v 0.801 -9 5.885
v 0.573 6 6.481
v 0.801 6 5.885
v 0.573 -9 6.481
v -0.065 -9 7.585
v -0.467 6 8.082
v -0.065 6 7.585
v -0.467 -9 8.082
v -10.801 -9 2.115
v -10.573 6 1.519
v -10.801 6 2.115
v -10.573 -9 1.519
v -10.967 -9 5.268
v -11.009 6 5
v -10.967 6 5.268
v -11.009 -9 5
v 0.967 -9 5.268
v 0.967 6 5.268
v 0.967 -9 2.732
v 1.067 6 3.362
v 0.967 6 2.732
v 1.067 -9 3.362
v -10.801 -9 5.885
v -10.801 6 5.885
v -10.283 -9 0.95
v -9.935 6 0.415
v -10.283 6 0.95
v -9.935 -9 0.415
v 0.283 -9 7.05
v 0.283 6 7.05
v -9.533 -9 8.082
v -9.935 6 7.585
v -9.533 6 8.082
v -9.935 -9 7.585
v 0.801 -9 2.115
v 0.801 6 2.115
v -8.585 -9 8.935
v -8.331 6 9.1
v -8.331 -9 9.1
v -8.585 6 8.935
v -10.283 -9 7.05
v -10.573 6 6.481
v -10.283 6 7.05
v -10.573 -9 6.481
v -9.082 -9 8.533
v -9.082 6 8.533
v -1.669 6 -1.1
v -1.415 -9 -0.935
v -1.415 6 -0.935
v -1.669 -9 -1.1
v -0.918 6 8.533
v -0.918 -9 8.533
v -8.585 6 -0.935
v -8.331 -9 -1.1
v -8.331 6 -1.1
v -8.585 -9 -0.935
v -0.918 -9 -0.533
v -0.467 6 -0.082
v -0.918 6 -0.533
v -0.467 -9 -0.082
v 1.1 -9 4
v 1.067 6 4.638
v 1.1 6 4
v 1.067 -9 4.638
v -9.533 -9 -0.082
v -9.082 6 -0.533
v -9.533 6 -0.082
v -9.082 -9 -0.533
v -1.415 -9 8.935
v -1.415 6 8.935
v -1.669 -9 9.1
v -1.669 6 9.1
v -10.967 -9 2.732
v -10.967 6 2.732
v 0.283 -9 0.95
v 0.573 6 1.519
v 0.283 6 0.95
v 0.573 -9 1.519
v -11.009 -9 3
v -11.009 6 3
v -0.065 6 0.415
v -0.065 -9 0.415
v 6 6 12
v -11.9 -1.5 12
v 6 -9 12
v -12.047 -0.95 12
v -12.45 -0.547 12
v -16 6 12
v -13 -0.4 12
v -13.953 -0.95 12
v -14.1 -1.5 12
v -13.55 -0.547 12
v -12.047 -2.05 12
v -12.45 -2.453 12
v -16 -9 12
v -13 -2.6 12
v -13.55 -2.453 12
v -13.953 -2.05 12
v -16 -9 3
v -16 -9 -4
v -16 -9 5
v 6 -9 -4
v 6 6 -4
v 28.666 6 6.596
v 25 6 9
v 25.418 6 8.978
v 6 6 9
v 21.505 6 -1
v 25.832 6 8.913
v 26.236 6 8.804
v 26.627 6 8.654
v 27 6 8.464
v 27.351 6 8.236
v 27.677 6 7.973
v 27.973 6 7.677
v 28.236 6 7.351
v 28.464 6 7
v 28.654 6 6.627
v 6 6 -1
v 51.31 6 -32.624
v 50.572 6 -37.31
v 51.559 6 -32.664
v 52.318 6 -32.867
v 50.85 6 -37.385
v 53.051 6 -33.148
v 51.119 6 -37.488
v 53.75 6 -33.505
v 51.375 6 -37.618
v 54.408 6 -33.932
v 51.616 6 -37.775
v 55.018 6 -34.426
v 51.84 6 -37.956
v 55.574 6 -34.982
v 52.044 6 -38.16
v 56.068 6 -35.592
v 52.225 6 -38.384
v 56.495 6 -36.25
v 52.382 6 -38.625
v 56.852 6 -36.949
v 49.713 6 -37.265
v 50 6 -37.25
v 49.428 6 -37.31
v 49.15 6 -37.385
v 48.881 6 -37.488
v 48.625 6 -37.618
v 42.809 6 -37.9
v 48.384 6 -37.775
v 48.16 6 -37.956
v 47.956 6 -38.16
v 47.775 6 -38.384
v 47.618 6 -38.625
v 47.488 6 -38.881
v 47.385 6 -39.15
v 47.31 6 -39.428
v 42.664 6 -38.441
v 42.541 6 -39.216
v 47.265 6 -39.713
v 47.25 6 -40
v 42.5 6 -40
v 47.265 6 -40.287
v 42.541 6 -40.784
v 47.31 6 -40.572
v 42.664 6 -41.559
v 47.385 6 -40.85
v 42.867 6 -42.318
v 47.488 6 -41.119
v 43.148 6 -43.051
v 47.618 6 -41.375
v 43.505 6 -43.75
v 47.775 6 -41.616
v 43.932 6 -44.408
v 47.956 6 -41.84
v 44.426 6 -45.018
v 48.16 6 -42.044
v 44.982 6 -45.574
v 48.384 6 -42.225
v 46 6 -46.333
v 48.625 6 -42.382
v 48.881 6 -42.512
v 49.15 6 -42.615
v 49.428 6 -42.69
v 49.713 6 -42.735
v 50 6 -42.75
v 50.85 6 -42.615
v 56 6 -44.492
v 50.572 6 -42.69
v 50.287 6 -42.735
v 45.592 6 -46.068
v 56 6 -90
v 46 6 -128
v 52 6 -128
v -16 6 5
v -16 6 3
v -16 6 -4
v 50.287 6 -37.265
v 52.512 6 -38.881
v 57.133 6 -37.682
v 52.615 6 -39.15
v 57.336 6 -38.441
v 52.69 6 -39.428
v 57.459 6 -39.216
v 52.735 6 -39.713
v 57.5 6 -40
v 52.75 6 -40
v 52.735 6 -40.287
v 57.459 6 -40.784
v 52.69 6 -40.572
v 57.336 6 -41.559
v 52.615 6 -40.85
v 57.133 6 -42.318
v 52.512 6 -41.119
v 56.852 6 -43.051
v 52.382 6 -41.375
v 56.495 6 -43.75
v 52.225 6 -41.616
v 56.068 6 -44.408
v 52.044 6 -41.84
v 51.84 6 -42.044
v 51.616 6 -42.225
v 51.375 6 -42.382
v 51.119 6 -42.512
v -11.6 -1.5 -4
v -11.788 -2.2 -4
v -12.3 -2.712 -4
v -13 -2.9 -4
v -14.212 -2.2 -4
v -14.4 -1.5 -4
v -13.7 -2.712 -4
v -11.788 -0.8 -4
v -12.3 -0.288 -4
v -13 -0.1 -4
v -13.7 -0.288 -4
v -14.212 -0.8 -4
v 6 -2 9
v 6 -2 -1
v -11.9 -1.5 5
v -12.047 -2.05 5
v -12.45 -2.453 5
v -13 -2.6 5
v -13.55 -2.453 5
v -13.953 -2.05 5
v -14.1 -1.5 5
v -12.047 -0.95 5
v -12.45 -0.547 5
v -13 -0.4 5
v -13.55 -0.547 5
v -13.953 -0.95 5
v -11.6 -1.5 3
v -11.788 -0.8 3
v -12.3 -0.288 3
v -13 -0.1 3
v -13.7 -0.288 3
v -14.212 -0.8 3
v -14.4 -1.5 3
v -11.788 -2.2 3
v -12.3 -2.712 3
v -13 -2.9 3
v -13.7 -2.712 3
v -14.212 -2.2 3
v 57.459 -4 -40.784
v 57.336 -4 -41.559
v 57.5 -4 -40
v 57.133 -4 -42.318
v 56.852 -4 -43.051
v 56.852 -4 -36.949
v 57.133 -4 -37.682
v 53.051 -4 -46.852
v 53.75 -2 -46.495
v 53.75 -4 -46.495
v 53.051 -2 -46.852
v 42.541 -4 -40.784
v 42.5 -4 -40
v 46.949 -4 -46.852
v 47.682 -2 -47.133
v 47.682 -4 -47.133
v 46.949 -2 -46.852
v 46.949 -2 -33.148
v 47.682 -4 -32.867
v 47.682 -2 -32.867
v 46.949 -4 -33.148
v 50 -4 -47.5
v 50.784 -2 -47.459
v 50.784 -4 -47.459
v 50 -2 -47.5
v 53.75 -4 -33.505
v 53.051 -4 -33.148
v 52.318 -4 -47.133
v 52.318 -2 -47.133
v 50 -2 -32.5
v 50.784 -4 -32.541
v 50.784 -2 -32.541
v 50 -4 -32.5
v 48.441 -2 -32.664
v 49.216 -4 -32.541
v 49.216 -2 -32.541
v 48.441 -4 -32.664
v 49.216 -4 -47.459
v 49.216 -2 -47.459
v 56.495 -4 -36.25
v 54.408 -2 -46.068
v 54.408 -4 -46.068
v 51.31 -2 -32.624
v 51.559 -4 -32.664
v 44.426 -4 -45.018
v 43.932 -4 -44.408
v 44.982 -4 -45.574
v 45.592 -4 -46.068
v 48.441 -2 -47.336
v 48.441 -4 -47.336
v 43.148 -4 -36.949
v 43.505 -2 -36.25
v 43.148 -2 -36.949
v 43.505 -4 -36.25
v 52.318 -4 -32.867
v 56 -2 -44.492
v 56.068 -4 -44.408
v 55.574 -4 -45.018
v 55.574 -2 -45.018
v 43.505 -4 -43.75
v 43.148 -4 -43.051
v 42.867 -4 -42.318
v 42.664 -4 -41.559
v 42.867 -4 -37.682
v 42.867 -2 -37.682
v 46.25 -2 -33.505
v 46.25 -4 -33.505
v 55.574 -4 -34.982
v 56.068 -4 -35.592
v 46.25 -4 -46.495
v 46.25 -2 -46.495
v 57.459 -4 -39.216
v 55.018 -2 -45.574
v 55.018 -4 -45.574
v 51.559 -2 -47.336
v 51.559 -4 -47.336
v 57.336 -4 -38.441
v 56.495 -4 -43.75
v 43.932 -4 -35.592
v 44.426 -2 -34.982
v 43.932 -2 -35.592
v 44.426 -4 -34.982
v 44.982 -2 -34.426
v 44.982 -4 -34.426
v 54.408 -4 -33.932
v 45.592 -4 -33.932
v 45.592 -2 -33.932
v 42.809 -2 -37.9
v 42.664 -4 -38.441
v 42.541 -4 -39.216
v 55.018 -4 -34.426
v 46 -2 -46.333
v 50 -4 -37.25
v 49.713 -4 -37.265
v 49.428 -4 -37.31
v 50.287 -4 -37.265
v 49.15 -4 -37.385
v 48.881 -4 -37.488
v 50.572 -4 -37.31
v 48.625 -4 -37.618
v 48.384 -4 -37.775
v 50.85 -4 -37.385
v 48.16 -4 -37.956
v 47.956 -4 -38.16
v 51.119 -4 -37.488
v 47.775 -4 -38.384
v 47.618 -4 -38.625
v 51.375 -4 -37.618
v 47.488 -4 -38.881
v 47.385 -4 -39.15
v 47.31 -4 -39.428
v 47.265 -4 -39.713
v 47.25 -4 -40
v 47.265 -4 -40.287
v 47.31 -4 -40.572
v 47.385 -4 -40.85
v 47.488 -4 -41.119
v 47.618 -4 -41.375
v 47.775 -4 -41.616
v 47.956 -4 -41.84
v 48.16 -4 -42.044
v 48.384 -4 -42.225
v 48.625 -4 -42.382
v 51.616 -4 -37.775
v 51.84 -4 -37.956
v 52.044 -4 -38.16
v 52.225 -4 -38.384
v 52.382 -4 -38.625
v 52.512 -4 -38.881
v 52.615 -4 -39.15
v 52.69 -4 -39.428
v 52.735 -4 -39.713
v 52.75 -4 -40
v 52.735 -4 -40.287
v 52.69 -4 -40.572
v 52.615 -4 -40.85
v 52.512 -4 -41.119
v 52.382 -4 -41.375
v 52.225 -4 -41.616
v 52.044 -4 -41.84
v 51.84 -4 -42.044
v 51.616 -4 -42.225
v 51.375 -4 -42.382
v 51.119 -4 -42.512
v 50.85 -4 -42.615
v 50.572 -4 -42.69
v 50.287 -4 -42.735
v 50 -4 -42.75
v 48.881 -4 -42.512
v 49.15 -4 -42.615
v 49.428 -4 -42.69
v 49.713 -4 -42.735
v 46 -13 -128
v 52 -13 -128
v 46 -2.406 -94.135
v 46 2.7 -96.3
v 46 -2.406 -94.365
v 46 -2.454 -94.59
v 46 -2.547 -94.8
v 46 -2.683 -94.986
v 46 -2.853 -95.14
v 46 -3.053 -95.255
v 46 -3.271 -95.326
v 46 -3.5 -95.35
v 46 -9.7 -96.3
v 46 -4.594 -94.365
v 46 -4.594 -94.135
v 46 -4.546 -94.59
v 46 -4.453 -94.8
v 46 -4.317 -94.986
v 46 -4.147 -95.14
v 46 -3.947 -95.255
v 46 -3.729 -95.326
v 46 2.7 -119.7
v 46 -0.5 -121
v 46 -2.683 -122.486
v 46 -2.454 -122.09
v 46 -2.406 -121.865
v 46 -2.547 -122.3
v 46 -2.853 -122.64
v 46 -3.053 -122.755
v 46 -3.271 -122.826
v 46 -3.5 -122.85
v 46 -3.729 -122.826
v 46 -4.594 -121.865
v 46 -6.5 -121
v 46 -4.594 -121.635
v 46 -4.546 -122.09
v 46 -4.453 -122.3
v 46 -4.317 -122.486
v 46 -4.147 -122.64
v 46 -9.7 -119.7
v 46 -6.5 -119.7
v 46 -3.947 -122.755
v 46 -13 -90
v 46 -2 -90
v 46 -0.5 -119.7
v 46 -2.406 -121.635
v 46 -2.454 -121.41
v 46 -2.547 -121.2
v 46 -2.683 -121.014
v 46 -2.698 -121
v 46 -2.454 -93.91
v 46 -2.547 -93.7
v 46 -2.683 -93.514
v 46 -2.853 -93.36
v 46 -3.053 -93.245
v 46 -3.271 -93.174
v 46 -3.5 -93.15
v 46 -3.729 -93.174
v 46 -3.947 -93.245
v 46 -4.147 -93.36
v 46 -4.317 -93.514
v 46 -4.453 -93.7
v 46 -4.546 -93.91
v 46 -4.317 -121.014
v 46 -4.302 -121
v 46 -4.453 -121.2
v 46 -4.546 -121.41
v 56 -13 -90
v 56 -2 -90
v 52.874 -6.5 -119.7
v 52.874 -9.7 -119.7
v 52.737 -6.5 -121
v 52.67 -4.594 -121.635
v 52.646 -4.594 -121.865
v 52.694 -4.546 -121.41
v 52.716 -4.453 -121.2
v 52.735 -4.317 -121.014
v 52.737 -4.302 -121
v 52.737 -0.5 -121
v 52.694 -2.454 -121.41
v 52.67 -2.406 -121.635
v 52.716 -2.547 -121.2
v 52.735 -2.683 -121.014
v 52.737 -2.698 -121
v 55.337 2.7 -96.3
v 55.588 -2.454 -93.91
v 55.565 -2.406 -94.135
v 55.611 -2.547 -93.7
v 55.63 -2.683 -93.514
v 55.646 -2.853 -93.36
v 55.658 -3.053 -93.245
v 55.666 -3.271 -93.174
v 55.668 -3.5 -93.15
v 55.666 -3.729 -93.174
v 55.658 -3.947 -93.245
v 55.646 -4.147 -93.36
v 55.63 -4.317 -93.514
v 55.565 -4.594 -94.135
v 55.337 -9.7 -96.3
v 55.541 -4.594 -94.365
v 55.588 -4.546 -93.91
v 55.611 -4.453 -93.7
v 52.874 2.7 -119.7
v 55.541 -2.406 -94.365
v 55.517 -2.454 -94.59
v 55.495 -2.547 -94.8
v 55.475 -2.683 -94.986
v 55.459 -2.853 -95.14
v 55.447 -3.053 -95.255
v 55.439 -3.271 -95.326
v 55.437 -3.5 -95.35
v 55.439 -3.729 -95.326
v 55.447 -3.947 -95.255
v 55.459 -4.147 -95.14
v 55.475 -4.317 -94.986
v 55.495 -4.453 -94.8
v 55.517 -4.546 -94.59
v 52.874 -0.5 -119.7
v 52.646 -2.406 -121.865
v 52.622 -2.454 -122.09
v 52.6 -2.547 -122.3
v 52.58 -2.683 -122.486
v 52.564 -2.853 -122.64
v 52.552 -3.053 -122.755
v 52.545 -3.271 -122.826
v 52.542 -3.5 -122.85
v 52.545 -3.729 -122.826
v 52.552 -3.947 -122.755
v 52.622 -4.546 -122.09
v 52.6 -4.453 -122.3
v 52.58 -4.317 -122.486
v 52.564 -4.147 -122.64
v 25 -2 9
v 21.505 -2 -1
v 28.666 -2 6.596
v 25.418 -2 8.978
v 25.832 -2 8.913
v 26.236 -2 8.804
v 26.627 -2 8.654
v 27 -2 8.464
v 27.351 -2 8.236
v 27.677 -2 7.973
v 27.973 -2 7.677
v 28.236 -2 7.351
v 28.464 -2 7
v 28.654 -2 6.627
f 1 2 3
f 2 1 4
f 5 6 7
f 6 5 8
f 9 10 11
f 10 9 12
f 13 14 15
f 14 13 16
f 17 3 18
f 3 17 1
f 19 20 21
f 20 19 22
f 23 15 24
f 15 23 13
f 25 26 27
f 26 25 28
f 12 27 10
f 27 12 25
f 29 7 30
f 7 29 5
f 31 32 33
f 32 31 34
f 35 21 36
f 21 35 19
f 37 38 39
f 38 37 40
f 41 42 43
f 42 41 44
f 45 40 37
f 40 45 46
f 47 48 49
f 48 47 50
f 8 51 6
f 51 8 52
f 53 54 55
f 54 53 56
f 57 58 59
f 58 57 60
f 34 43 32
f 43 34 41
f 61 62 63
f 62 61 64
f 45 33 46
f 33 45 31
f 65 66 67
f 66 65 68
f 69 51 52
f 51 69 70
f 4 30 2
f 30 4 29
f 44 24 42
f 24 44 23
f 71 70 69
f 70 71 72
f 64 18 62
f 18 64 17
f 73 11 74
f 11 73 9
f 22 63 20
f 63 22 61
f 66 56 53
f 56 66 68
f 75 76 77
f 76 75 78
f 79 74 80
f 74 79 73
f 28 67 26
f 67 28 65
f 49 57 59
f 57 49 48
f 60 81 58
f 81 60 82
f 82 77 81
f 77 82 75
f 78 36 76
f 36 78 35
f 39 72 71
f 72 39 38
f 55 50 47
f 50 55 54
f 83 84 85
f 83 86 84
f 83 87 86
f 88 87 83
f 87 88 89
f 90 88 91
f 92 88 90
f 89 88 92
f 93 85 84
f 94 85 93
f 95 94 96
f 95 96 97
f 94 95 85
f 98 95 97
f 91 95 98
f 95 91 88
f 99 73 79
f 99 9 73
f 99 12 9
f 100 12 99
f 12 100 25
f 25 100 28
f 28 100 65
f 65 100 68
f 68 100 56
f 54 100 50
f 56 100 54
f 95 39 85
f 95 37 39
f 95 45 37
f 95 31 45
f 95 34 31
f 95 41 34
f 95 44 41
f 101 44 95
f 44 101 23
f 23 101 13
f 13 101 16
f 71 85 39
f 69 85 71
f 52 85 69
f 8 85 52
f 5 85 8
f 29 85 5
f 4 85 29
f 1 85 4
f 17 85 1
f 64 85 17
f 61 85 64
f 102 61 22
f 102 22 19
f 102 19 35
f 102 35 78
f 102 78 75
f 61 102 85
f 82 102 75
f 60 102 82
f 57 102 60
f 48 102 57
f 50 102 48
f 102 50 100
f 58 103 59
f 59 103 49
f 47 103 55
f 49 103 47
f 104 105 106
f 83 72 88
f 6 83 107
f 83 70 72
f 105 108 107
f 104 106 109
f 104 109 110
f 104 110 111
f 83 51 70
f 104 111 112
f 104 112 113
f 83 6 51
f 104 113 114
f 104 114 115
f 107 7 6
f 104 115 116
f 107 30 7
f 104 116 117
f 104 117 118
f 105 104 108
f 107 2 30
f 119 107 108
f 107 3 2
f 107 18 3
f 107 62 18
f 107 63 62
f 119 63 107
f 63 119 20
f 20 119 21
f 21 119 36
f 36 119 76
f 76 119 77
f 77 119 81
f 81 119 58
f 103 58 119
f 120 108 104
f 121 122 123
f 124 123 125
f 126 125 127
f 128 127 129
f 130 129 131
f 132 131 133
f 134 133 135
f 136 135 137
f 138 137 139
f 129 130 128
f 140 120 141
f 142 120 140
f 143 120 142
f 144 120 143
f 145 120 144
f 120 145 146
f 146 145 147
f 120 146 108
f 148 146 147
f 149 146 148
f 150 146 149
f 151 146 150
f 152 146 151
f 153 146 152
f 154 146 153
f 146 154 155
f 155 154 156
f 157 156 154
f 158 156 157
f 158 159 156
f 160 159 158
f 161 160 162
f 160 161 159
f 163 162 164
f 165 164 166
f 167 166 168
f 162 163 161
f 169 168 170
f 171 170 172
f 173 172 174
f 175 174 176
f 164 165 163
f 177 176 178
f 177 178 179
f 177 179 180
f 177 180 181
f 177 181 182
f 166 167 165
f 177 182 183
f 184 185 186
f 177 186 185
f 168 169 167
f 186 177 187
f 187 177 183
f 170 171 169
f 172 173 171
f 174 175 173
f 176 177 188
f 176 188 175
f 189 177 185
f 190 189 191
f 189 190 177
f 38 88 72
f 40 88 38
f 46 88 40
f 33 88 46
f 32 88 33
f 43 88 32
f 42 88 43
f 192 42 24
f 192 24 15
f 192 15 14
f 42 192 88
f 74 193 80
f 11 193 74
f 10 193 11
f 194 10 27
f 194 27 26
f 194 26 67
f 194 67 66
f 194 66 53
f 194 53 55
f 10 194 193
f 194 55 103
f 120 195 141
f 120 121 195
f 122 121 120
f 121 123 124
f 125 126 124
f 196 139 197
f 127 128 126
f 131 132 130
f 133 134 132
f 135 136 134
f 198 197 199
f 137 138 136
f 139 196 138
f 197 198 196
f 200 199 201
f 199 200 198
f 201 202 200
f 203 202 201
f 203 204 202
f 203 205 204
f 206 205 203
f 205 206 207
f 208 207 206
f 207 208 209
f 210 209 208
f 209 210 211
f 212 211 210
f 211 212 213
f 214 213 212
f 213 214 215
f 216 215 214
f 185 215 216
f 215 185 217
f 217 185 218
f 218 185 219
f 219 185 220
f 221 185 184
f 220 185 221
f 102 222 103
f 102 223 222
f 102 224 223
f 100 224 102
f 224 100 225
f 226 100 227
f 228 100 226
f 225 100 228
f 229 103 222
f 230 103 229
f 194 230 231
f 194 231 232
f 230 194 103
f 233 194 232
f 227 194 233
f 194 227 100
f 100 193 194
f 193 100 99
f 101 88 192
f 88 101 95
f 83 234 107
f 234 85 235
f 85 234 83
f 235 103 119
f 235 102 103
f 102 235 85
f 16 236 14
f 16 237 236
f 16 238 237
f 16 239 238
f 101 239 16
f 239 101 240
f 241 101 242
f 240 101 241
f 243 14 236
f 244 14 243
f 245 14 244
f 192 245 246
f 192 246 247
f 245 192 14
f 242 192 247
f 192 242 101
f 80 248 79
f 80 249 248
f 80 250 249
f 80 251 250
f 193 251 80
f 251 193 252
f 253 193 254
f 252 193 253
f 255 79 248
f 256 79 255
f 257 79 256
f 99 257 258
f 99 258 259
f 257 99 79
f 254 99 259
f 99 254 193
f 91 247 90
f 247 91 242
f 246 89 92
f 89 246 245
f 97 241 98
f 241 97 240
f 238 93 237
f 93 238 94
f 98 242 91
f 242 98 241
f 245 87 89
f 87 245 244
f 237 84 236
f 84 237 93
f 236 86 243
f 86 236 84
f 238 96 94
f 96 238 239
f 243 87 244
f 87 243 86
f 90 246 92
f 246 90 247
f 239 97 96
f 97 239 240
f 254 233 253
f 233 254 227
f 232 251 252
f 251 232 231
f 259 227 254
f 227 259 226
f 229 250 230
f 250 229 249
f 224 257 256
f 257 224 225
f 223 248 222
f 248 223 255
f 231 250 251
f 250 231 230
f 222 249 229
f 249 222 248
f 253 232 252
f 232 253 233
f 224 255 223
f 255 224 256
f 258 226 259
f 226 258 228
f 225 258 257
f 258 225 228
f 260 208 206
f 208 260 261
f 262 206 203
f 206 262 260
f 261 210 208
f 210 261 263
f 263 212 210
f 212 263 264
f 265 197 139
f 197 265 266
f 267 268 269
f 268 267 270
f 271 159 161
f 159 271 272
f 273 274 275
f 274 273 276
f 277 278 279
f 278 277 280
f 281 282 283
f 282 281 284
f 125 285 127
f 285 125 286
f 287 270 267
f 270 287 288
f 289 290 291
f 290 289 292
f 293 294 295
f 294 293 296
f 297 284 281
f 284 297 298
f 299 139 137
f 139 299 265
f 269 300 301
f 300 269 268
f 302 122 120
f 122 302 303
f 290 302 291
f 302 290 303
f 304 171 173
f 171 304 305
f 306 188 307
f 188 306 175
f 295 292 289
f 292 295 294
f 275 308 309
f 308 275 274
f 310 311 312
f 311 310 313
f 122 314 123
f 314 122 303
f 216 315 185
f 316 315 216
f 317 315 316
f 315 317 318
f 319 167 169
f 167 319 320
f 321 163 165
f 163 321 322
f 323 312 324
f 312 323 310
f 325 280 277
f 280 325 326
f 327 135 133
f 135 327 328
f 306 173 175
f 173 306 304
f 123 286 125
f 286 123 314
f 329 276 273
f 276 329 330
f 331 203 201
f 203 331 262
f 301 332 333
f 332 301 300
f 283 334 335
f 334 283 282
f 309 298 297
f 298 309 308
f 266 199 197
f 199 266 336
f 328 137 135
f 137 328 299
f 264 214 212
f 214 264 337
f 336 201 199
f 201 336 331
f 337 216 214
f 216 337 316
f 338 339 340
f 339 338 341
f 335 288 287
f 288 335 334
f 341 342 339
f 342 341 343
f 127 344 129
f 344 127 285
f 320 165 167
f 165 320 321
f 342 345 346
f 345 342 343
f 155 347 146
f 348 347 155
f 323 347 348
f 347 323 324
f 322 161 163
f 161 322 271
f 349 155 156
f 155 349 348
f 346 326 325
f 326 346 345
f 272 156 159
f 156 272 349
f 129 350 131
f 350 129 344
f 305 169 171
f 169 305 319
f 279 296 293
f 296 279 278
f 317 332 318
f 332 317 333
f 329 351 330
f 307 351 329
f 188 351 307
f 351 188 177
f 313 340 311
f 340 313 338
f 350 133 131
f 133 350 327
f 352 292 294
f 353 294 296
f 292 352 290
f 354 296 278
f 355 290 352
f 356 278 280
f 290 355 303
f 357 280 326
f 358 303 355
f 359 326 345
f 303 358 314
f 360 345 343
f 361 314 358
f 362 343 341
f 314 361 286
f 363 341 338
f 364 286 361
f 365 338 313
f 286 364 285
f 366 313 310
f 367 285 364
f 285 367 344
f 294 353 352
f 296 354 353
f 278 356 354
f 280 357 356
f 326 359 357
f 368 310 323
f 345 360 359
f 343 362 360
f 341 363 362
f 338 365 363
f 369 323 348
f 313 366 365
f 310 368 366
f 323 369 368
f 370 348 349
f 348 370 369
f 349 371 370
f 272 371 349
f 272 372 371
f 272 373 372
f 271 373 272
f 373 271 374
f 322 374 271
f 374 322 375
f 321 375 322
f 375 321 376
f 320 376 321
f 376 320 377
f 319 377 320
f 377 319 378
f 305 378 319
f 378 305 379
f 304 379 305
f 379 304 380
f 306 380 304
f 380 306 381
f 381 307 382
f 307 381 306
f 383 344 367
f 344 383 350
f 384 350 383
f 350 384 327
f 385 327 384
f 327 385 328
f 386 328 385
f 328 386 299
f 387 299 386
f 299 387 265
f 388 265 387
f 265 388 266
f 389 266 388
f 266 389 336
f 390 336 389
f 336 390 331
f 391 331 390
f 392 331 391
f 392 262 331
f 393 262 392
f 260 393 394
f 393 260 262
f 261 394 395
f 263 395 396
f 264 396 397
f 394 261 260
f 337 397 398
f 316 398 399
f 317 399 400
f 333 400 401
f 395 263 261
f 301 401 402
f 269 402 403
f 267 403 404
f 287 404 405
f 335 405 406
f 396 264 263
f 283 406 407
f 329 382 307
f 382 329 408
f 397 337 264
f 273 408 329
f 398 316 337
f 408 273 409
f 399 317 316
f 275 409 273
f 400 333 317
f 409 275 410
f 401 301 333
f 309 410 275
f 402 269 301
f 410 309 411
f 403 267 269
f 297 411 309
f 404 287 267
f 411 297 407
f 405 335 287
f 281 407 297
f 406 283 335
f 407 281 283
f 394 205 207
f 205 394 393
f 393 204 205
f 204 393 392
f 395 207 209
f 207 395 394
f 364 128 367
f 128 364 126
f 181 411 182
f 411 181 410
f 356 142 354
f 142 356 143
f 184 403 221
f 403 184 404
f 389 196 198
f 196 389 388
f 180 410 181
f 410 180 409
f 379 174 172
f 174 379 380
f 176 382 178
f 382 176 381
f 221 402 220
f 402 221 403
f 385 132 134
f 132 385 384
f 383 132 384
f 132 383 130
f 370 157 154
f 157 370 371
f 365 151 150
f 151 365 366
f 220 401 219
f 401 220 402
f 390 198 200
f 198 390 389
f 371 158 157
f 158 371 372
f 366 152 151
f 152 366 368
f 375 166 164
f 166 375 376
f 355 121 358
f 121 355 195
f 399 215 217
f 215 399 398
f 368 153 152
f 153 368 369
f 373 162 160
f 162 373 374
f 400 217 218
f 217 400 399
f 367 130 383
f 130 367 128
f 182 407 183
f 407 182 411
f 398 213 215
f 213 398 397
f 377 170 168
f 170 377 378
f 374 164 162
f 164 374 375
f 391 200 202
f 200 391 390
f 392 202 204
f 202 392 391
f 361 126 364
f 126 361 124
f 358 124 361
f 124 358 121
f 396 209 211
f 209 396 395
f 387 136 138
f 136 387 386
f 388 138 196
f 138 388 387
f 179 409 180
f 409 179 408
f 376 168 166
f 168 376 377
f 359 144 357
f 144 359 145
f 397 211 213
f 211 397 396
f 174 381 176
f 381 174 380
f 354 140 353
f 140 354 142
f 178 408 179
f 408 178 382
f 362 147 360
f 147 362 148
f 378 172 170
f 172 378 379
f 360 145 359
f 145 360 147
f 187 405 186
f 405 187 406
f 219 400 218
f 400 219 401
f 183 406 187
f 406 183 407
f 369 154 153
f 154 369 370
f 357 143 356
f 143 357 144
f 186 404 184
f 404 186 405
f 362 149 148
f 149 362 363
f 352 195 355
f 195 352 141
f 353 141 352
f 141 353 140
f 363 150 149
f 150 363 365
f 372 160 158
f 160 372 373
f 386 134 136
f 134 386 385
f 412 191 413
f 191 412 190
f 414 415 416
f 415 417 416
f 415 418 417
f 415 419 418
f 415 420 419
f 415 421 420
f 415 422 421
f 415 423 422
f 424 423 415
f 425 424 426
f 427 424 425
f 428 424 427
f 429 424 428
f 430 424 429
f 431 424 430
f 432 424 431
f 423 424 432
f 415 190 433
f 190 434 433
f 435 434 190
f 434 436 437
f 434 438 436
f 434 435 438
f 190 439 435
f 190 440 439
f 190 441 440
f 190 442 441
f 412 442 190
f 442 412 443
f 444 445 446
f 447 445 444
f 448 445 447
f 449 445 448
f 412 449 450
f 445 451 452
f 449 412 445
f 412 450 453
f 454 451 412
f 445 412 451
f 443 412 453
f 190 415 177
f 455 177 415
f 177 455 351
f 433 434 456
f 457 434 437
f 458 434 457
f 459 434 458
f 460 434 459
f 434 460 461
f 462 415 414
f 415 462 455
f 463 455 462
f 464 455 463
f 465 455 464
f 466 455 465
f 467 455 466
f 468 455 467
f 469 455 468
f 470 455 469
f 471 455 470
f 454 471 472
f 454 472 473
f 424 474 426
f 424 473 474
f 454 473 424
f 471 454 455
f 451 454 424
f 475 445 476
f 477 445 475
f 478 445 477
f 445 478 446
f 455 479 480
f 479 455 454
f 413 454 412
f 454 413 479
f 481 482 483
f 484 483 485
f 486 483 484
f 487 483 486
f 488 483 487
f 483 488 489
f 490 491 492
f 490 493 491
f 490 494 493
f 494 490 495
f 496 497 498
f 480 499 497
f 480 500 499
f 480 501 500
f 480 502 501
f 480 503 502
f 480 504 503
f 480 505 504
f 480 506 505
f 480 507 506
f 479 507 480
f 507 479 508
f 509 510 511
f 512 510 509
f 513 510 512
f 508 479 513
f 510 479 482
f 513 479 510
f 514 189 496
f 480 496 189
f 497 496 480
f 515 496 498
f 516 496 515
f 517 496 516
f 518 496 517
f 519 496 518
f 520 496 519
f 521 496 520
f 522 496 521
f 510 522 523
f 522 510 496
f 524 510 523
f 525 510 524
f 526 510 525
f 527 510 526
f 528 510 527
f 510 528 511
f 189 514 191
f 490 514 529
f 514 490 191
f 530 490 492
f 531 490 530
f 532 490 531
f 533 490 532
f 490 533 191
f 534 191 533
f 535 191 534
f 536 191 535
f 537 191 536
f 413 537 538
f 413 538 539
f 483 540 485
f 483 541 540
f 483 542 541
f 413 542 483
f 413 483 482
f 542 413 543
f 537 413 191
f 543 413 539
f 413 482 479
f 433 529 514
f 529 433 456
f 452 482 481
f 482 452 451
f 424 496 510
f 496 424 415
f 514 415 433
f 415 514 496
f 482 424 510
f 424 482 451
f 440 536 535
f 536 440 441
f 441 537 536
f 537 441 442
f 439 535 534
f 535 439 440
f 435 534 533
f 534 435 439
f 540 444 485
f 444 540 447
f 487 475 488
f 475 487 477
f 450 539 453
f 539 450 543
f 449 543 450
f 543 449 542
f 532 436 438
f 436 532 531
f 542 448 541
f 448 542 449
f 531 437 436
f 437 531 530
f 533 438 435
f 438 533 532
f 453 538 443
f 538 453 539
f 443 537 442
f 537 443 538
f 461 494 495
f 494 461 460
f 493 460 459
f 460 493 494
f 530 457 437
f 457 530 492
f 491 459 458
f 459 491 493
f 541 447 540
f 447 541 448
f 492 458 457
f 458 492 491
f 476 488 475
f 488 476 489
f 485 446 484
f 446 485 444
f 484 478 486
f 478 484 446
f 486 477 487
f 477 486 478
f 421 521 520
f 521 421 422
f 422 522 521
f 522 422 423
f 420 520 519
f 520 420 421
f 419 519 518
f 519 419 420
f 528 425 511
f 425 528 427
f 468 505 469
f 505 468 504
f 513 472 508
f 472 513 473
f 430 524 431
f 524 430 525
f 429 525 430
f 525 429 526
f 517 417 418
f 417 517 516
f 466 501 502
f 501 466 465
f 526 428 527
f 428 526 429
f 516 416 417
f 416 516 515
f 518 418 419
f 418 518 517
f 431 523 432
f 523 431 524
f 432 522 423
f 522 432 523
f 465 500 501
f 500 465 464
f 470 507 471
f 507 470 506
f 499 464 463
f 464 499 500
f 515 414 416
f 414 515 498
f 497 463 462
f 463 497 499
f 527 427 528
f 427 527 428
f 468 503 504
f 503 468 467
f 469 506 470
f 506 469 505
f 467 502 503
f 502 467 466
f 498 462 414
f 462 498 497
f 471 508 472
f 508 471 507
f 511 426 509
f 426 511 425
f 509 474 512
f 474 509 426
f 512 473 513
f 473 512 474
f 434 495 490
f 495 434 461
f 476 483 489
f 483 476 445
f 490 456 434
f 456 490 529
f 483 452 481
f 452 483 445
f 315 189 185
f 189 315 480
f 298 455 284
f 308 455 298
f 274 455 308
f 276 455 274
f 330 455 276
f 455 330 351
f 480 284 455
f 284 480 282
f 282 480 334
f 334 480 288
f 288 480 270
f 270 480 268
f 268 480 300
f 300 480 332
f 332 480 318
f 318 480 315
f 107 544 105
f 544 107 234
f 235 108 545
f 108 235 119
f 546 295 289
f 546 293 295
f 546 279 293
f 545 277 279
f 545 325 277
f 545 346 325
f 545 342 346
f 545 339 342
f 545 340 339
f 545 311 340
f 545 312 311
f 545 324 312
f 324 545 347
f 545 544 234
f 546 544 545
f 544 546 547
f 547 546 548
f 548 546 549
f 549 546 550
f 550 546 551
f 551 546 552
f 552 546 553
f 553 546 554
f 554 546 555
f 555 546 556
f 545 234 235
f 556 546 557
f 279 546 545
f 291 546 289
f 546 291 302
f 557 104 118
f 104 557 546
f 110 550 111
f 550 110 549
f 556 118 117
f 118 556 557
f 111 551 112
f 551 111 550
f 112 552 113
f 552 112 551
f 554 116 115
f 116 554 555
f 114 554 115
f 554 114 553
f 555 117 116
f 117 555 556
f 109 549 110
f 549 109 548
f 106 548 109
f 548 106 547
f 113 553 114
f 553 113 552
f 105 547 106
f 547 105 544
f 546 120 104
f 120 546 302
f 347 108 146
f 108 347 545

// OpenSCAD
rotate([90,-90,0])translate([4,5,-6])wheel_bracket();
$fn=60;

translate([4,-2,-1])cube([21,8,10]);
translate([25,6,5])rotate([90,0,0])
cylinder(d=8,h=8);
translate([20.35,-2,1])rotate([0,60,0])
translate([-1.5,0,0])cube([49,8,10]);
difference(){
translate([50,-4,-40])rotate([-90,0,0])
cylinder(d=15,h=10);
translate([50,-5,-40])rotate([-90,0,0])
cylinder(d=5.5,h=12);
}
translate([47,0,-45])
rotate([0,90,0])
{
    translate([-1,-2,-1])cube([46,8,10]);
    translate([63,-3.5,-1])rotate([0,0,0])
    servo_bracket();
}


module servo_bracket(){
difference(){
union(){
translate([1,0,3])cube([38,19,6],center=true);
translate([0,9.5,2])
rotate([90,0,0])linear_extrude(height=19)
polygon([[-18,0],[20,4],[-18,8]]);
translate([13.75,0,0])cylinder(d=8,h=2,$fn=60);
}
cube([23.4,12.4,50],center=true);
translate([13.75,0,-1])cylinder(d=2.2,h=60,$fn=30);
translate([-13.75,0,-1])cylinder(d=2.2,h=50,$fn=30);
translate([7,-3,-1])cube([6,6,12]);
}
}

module wheel_bracket(){
    difference(){
translate([-8,-11,0])cube([16,22,15]);
difference(){
    translate([0,0,-1])cylinder(d=12.2,h=25,$fn=60);
    translate([6.1,0,-1])cube([2,16,40],center=true);
    translate([-6.1,0,-1])cube([2,16,40],center=true);
}
//translate([0,14,-15])rotate([45,0,0])cube(30,center=true);
translate([-1,0,-1])cube([2,22,25]);
translate([-9,8,7.5])rotate([0,90,0])
cylinder(d=2.2,h=21,$fn=12);
translate([-9,8,7.5])rotate([0,90,0])
cylinder(d=2.8,h=10,$fn=12);
}
}
